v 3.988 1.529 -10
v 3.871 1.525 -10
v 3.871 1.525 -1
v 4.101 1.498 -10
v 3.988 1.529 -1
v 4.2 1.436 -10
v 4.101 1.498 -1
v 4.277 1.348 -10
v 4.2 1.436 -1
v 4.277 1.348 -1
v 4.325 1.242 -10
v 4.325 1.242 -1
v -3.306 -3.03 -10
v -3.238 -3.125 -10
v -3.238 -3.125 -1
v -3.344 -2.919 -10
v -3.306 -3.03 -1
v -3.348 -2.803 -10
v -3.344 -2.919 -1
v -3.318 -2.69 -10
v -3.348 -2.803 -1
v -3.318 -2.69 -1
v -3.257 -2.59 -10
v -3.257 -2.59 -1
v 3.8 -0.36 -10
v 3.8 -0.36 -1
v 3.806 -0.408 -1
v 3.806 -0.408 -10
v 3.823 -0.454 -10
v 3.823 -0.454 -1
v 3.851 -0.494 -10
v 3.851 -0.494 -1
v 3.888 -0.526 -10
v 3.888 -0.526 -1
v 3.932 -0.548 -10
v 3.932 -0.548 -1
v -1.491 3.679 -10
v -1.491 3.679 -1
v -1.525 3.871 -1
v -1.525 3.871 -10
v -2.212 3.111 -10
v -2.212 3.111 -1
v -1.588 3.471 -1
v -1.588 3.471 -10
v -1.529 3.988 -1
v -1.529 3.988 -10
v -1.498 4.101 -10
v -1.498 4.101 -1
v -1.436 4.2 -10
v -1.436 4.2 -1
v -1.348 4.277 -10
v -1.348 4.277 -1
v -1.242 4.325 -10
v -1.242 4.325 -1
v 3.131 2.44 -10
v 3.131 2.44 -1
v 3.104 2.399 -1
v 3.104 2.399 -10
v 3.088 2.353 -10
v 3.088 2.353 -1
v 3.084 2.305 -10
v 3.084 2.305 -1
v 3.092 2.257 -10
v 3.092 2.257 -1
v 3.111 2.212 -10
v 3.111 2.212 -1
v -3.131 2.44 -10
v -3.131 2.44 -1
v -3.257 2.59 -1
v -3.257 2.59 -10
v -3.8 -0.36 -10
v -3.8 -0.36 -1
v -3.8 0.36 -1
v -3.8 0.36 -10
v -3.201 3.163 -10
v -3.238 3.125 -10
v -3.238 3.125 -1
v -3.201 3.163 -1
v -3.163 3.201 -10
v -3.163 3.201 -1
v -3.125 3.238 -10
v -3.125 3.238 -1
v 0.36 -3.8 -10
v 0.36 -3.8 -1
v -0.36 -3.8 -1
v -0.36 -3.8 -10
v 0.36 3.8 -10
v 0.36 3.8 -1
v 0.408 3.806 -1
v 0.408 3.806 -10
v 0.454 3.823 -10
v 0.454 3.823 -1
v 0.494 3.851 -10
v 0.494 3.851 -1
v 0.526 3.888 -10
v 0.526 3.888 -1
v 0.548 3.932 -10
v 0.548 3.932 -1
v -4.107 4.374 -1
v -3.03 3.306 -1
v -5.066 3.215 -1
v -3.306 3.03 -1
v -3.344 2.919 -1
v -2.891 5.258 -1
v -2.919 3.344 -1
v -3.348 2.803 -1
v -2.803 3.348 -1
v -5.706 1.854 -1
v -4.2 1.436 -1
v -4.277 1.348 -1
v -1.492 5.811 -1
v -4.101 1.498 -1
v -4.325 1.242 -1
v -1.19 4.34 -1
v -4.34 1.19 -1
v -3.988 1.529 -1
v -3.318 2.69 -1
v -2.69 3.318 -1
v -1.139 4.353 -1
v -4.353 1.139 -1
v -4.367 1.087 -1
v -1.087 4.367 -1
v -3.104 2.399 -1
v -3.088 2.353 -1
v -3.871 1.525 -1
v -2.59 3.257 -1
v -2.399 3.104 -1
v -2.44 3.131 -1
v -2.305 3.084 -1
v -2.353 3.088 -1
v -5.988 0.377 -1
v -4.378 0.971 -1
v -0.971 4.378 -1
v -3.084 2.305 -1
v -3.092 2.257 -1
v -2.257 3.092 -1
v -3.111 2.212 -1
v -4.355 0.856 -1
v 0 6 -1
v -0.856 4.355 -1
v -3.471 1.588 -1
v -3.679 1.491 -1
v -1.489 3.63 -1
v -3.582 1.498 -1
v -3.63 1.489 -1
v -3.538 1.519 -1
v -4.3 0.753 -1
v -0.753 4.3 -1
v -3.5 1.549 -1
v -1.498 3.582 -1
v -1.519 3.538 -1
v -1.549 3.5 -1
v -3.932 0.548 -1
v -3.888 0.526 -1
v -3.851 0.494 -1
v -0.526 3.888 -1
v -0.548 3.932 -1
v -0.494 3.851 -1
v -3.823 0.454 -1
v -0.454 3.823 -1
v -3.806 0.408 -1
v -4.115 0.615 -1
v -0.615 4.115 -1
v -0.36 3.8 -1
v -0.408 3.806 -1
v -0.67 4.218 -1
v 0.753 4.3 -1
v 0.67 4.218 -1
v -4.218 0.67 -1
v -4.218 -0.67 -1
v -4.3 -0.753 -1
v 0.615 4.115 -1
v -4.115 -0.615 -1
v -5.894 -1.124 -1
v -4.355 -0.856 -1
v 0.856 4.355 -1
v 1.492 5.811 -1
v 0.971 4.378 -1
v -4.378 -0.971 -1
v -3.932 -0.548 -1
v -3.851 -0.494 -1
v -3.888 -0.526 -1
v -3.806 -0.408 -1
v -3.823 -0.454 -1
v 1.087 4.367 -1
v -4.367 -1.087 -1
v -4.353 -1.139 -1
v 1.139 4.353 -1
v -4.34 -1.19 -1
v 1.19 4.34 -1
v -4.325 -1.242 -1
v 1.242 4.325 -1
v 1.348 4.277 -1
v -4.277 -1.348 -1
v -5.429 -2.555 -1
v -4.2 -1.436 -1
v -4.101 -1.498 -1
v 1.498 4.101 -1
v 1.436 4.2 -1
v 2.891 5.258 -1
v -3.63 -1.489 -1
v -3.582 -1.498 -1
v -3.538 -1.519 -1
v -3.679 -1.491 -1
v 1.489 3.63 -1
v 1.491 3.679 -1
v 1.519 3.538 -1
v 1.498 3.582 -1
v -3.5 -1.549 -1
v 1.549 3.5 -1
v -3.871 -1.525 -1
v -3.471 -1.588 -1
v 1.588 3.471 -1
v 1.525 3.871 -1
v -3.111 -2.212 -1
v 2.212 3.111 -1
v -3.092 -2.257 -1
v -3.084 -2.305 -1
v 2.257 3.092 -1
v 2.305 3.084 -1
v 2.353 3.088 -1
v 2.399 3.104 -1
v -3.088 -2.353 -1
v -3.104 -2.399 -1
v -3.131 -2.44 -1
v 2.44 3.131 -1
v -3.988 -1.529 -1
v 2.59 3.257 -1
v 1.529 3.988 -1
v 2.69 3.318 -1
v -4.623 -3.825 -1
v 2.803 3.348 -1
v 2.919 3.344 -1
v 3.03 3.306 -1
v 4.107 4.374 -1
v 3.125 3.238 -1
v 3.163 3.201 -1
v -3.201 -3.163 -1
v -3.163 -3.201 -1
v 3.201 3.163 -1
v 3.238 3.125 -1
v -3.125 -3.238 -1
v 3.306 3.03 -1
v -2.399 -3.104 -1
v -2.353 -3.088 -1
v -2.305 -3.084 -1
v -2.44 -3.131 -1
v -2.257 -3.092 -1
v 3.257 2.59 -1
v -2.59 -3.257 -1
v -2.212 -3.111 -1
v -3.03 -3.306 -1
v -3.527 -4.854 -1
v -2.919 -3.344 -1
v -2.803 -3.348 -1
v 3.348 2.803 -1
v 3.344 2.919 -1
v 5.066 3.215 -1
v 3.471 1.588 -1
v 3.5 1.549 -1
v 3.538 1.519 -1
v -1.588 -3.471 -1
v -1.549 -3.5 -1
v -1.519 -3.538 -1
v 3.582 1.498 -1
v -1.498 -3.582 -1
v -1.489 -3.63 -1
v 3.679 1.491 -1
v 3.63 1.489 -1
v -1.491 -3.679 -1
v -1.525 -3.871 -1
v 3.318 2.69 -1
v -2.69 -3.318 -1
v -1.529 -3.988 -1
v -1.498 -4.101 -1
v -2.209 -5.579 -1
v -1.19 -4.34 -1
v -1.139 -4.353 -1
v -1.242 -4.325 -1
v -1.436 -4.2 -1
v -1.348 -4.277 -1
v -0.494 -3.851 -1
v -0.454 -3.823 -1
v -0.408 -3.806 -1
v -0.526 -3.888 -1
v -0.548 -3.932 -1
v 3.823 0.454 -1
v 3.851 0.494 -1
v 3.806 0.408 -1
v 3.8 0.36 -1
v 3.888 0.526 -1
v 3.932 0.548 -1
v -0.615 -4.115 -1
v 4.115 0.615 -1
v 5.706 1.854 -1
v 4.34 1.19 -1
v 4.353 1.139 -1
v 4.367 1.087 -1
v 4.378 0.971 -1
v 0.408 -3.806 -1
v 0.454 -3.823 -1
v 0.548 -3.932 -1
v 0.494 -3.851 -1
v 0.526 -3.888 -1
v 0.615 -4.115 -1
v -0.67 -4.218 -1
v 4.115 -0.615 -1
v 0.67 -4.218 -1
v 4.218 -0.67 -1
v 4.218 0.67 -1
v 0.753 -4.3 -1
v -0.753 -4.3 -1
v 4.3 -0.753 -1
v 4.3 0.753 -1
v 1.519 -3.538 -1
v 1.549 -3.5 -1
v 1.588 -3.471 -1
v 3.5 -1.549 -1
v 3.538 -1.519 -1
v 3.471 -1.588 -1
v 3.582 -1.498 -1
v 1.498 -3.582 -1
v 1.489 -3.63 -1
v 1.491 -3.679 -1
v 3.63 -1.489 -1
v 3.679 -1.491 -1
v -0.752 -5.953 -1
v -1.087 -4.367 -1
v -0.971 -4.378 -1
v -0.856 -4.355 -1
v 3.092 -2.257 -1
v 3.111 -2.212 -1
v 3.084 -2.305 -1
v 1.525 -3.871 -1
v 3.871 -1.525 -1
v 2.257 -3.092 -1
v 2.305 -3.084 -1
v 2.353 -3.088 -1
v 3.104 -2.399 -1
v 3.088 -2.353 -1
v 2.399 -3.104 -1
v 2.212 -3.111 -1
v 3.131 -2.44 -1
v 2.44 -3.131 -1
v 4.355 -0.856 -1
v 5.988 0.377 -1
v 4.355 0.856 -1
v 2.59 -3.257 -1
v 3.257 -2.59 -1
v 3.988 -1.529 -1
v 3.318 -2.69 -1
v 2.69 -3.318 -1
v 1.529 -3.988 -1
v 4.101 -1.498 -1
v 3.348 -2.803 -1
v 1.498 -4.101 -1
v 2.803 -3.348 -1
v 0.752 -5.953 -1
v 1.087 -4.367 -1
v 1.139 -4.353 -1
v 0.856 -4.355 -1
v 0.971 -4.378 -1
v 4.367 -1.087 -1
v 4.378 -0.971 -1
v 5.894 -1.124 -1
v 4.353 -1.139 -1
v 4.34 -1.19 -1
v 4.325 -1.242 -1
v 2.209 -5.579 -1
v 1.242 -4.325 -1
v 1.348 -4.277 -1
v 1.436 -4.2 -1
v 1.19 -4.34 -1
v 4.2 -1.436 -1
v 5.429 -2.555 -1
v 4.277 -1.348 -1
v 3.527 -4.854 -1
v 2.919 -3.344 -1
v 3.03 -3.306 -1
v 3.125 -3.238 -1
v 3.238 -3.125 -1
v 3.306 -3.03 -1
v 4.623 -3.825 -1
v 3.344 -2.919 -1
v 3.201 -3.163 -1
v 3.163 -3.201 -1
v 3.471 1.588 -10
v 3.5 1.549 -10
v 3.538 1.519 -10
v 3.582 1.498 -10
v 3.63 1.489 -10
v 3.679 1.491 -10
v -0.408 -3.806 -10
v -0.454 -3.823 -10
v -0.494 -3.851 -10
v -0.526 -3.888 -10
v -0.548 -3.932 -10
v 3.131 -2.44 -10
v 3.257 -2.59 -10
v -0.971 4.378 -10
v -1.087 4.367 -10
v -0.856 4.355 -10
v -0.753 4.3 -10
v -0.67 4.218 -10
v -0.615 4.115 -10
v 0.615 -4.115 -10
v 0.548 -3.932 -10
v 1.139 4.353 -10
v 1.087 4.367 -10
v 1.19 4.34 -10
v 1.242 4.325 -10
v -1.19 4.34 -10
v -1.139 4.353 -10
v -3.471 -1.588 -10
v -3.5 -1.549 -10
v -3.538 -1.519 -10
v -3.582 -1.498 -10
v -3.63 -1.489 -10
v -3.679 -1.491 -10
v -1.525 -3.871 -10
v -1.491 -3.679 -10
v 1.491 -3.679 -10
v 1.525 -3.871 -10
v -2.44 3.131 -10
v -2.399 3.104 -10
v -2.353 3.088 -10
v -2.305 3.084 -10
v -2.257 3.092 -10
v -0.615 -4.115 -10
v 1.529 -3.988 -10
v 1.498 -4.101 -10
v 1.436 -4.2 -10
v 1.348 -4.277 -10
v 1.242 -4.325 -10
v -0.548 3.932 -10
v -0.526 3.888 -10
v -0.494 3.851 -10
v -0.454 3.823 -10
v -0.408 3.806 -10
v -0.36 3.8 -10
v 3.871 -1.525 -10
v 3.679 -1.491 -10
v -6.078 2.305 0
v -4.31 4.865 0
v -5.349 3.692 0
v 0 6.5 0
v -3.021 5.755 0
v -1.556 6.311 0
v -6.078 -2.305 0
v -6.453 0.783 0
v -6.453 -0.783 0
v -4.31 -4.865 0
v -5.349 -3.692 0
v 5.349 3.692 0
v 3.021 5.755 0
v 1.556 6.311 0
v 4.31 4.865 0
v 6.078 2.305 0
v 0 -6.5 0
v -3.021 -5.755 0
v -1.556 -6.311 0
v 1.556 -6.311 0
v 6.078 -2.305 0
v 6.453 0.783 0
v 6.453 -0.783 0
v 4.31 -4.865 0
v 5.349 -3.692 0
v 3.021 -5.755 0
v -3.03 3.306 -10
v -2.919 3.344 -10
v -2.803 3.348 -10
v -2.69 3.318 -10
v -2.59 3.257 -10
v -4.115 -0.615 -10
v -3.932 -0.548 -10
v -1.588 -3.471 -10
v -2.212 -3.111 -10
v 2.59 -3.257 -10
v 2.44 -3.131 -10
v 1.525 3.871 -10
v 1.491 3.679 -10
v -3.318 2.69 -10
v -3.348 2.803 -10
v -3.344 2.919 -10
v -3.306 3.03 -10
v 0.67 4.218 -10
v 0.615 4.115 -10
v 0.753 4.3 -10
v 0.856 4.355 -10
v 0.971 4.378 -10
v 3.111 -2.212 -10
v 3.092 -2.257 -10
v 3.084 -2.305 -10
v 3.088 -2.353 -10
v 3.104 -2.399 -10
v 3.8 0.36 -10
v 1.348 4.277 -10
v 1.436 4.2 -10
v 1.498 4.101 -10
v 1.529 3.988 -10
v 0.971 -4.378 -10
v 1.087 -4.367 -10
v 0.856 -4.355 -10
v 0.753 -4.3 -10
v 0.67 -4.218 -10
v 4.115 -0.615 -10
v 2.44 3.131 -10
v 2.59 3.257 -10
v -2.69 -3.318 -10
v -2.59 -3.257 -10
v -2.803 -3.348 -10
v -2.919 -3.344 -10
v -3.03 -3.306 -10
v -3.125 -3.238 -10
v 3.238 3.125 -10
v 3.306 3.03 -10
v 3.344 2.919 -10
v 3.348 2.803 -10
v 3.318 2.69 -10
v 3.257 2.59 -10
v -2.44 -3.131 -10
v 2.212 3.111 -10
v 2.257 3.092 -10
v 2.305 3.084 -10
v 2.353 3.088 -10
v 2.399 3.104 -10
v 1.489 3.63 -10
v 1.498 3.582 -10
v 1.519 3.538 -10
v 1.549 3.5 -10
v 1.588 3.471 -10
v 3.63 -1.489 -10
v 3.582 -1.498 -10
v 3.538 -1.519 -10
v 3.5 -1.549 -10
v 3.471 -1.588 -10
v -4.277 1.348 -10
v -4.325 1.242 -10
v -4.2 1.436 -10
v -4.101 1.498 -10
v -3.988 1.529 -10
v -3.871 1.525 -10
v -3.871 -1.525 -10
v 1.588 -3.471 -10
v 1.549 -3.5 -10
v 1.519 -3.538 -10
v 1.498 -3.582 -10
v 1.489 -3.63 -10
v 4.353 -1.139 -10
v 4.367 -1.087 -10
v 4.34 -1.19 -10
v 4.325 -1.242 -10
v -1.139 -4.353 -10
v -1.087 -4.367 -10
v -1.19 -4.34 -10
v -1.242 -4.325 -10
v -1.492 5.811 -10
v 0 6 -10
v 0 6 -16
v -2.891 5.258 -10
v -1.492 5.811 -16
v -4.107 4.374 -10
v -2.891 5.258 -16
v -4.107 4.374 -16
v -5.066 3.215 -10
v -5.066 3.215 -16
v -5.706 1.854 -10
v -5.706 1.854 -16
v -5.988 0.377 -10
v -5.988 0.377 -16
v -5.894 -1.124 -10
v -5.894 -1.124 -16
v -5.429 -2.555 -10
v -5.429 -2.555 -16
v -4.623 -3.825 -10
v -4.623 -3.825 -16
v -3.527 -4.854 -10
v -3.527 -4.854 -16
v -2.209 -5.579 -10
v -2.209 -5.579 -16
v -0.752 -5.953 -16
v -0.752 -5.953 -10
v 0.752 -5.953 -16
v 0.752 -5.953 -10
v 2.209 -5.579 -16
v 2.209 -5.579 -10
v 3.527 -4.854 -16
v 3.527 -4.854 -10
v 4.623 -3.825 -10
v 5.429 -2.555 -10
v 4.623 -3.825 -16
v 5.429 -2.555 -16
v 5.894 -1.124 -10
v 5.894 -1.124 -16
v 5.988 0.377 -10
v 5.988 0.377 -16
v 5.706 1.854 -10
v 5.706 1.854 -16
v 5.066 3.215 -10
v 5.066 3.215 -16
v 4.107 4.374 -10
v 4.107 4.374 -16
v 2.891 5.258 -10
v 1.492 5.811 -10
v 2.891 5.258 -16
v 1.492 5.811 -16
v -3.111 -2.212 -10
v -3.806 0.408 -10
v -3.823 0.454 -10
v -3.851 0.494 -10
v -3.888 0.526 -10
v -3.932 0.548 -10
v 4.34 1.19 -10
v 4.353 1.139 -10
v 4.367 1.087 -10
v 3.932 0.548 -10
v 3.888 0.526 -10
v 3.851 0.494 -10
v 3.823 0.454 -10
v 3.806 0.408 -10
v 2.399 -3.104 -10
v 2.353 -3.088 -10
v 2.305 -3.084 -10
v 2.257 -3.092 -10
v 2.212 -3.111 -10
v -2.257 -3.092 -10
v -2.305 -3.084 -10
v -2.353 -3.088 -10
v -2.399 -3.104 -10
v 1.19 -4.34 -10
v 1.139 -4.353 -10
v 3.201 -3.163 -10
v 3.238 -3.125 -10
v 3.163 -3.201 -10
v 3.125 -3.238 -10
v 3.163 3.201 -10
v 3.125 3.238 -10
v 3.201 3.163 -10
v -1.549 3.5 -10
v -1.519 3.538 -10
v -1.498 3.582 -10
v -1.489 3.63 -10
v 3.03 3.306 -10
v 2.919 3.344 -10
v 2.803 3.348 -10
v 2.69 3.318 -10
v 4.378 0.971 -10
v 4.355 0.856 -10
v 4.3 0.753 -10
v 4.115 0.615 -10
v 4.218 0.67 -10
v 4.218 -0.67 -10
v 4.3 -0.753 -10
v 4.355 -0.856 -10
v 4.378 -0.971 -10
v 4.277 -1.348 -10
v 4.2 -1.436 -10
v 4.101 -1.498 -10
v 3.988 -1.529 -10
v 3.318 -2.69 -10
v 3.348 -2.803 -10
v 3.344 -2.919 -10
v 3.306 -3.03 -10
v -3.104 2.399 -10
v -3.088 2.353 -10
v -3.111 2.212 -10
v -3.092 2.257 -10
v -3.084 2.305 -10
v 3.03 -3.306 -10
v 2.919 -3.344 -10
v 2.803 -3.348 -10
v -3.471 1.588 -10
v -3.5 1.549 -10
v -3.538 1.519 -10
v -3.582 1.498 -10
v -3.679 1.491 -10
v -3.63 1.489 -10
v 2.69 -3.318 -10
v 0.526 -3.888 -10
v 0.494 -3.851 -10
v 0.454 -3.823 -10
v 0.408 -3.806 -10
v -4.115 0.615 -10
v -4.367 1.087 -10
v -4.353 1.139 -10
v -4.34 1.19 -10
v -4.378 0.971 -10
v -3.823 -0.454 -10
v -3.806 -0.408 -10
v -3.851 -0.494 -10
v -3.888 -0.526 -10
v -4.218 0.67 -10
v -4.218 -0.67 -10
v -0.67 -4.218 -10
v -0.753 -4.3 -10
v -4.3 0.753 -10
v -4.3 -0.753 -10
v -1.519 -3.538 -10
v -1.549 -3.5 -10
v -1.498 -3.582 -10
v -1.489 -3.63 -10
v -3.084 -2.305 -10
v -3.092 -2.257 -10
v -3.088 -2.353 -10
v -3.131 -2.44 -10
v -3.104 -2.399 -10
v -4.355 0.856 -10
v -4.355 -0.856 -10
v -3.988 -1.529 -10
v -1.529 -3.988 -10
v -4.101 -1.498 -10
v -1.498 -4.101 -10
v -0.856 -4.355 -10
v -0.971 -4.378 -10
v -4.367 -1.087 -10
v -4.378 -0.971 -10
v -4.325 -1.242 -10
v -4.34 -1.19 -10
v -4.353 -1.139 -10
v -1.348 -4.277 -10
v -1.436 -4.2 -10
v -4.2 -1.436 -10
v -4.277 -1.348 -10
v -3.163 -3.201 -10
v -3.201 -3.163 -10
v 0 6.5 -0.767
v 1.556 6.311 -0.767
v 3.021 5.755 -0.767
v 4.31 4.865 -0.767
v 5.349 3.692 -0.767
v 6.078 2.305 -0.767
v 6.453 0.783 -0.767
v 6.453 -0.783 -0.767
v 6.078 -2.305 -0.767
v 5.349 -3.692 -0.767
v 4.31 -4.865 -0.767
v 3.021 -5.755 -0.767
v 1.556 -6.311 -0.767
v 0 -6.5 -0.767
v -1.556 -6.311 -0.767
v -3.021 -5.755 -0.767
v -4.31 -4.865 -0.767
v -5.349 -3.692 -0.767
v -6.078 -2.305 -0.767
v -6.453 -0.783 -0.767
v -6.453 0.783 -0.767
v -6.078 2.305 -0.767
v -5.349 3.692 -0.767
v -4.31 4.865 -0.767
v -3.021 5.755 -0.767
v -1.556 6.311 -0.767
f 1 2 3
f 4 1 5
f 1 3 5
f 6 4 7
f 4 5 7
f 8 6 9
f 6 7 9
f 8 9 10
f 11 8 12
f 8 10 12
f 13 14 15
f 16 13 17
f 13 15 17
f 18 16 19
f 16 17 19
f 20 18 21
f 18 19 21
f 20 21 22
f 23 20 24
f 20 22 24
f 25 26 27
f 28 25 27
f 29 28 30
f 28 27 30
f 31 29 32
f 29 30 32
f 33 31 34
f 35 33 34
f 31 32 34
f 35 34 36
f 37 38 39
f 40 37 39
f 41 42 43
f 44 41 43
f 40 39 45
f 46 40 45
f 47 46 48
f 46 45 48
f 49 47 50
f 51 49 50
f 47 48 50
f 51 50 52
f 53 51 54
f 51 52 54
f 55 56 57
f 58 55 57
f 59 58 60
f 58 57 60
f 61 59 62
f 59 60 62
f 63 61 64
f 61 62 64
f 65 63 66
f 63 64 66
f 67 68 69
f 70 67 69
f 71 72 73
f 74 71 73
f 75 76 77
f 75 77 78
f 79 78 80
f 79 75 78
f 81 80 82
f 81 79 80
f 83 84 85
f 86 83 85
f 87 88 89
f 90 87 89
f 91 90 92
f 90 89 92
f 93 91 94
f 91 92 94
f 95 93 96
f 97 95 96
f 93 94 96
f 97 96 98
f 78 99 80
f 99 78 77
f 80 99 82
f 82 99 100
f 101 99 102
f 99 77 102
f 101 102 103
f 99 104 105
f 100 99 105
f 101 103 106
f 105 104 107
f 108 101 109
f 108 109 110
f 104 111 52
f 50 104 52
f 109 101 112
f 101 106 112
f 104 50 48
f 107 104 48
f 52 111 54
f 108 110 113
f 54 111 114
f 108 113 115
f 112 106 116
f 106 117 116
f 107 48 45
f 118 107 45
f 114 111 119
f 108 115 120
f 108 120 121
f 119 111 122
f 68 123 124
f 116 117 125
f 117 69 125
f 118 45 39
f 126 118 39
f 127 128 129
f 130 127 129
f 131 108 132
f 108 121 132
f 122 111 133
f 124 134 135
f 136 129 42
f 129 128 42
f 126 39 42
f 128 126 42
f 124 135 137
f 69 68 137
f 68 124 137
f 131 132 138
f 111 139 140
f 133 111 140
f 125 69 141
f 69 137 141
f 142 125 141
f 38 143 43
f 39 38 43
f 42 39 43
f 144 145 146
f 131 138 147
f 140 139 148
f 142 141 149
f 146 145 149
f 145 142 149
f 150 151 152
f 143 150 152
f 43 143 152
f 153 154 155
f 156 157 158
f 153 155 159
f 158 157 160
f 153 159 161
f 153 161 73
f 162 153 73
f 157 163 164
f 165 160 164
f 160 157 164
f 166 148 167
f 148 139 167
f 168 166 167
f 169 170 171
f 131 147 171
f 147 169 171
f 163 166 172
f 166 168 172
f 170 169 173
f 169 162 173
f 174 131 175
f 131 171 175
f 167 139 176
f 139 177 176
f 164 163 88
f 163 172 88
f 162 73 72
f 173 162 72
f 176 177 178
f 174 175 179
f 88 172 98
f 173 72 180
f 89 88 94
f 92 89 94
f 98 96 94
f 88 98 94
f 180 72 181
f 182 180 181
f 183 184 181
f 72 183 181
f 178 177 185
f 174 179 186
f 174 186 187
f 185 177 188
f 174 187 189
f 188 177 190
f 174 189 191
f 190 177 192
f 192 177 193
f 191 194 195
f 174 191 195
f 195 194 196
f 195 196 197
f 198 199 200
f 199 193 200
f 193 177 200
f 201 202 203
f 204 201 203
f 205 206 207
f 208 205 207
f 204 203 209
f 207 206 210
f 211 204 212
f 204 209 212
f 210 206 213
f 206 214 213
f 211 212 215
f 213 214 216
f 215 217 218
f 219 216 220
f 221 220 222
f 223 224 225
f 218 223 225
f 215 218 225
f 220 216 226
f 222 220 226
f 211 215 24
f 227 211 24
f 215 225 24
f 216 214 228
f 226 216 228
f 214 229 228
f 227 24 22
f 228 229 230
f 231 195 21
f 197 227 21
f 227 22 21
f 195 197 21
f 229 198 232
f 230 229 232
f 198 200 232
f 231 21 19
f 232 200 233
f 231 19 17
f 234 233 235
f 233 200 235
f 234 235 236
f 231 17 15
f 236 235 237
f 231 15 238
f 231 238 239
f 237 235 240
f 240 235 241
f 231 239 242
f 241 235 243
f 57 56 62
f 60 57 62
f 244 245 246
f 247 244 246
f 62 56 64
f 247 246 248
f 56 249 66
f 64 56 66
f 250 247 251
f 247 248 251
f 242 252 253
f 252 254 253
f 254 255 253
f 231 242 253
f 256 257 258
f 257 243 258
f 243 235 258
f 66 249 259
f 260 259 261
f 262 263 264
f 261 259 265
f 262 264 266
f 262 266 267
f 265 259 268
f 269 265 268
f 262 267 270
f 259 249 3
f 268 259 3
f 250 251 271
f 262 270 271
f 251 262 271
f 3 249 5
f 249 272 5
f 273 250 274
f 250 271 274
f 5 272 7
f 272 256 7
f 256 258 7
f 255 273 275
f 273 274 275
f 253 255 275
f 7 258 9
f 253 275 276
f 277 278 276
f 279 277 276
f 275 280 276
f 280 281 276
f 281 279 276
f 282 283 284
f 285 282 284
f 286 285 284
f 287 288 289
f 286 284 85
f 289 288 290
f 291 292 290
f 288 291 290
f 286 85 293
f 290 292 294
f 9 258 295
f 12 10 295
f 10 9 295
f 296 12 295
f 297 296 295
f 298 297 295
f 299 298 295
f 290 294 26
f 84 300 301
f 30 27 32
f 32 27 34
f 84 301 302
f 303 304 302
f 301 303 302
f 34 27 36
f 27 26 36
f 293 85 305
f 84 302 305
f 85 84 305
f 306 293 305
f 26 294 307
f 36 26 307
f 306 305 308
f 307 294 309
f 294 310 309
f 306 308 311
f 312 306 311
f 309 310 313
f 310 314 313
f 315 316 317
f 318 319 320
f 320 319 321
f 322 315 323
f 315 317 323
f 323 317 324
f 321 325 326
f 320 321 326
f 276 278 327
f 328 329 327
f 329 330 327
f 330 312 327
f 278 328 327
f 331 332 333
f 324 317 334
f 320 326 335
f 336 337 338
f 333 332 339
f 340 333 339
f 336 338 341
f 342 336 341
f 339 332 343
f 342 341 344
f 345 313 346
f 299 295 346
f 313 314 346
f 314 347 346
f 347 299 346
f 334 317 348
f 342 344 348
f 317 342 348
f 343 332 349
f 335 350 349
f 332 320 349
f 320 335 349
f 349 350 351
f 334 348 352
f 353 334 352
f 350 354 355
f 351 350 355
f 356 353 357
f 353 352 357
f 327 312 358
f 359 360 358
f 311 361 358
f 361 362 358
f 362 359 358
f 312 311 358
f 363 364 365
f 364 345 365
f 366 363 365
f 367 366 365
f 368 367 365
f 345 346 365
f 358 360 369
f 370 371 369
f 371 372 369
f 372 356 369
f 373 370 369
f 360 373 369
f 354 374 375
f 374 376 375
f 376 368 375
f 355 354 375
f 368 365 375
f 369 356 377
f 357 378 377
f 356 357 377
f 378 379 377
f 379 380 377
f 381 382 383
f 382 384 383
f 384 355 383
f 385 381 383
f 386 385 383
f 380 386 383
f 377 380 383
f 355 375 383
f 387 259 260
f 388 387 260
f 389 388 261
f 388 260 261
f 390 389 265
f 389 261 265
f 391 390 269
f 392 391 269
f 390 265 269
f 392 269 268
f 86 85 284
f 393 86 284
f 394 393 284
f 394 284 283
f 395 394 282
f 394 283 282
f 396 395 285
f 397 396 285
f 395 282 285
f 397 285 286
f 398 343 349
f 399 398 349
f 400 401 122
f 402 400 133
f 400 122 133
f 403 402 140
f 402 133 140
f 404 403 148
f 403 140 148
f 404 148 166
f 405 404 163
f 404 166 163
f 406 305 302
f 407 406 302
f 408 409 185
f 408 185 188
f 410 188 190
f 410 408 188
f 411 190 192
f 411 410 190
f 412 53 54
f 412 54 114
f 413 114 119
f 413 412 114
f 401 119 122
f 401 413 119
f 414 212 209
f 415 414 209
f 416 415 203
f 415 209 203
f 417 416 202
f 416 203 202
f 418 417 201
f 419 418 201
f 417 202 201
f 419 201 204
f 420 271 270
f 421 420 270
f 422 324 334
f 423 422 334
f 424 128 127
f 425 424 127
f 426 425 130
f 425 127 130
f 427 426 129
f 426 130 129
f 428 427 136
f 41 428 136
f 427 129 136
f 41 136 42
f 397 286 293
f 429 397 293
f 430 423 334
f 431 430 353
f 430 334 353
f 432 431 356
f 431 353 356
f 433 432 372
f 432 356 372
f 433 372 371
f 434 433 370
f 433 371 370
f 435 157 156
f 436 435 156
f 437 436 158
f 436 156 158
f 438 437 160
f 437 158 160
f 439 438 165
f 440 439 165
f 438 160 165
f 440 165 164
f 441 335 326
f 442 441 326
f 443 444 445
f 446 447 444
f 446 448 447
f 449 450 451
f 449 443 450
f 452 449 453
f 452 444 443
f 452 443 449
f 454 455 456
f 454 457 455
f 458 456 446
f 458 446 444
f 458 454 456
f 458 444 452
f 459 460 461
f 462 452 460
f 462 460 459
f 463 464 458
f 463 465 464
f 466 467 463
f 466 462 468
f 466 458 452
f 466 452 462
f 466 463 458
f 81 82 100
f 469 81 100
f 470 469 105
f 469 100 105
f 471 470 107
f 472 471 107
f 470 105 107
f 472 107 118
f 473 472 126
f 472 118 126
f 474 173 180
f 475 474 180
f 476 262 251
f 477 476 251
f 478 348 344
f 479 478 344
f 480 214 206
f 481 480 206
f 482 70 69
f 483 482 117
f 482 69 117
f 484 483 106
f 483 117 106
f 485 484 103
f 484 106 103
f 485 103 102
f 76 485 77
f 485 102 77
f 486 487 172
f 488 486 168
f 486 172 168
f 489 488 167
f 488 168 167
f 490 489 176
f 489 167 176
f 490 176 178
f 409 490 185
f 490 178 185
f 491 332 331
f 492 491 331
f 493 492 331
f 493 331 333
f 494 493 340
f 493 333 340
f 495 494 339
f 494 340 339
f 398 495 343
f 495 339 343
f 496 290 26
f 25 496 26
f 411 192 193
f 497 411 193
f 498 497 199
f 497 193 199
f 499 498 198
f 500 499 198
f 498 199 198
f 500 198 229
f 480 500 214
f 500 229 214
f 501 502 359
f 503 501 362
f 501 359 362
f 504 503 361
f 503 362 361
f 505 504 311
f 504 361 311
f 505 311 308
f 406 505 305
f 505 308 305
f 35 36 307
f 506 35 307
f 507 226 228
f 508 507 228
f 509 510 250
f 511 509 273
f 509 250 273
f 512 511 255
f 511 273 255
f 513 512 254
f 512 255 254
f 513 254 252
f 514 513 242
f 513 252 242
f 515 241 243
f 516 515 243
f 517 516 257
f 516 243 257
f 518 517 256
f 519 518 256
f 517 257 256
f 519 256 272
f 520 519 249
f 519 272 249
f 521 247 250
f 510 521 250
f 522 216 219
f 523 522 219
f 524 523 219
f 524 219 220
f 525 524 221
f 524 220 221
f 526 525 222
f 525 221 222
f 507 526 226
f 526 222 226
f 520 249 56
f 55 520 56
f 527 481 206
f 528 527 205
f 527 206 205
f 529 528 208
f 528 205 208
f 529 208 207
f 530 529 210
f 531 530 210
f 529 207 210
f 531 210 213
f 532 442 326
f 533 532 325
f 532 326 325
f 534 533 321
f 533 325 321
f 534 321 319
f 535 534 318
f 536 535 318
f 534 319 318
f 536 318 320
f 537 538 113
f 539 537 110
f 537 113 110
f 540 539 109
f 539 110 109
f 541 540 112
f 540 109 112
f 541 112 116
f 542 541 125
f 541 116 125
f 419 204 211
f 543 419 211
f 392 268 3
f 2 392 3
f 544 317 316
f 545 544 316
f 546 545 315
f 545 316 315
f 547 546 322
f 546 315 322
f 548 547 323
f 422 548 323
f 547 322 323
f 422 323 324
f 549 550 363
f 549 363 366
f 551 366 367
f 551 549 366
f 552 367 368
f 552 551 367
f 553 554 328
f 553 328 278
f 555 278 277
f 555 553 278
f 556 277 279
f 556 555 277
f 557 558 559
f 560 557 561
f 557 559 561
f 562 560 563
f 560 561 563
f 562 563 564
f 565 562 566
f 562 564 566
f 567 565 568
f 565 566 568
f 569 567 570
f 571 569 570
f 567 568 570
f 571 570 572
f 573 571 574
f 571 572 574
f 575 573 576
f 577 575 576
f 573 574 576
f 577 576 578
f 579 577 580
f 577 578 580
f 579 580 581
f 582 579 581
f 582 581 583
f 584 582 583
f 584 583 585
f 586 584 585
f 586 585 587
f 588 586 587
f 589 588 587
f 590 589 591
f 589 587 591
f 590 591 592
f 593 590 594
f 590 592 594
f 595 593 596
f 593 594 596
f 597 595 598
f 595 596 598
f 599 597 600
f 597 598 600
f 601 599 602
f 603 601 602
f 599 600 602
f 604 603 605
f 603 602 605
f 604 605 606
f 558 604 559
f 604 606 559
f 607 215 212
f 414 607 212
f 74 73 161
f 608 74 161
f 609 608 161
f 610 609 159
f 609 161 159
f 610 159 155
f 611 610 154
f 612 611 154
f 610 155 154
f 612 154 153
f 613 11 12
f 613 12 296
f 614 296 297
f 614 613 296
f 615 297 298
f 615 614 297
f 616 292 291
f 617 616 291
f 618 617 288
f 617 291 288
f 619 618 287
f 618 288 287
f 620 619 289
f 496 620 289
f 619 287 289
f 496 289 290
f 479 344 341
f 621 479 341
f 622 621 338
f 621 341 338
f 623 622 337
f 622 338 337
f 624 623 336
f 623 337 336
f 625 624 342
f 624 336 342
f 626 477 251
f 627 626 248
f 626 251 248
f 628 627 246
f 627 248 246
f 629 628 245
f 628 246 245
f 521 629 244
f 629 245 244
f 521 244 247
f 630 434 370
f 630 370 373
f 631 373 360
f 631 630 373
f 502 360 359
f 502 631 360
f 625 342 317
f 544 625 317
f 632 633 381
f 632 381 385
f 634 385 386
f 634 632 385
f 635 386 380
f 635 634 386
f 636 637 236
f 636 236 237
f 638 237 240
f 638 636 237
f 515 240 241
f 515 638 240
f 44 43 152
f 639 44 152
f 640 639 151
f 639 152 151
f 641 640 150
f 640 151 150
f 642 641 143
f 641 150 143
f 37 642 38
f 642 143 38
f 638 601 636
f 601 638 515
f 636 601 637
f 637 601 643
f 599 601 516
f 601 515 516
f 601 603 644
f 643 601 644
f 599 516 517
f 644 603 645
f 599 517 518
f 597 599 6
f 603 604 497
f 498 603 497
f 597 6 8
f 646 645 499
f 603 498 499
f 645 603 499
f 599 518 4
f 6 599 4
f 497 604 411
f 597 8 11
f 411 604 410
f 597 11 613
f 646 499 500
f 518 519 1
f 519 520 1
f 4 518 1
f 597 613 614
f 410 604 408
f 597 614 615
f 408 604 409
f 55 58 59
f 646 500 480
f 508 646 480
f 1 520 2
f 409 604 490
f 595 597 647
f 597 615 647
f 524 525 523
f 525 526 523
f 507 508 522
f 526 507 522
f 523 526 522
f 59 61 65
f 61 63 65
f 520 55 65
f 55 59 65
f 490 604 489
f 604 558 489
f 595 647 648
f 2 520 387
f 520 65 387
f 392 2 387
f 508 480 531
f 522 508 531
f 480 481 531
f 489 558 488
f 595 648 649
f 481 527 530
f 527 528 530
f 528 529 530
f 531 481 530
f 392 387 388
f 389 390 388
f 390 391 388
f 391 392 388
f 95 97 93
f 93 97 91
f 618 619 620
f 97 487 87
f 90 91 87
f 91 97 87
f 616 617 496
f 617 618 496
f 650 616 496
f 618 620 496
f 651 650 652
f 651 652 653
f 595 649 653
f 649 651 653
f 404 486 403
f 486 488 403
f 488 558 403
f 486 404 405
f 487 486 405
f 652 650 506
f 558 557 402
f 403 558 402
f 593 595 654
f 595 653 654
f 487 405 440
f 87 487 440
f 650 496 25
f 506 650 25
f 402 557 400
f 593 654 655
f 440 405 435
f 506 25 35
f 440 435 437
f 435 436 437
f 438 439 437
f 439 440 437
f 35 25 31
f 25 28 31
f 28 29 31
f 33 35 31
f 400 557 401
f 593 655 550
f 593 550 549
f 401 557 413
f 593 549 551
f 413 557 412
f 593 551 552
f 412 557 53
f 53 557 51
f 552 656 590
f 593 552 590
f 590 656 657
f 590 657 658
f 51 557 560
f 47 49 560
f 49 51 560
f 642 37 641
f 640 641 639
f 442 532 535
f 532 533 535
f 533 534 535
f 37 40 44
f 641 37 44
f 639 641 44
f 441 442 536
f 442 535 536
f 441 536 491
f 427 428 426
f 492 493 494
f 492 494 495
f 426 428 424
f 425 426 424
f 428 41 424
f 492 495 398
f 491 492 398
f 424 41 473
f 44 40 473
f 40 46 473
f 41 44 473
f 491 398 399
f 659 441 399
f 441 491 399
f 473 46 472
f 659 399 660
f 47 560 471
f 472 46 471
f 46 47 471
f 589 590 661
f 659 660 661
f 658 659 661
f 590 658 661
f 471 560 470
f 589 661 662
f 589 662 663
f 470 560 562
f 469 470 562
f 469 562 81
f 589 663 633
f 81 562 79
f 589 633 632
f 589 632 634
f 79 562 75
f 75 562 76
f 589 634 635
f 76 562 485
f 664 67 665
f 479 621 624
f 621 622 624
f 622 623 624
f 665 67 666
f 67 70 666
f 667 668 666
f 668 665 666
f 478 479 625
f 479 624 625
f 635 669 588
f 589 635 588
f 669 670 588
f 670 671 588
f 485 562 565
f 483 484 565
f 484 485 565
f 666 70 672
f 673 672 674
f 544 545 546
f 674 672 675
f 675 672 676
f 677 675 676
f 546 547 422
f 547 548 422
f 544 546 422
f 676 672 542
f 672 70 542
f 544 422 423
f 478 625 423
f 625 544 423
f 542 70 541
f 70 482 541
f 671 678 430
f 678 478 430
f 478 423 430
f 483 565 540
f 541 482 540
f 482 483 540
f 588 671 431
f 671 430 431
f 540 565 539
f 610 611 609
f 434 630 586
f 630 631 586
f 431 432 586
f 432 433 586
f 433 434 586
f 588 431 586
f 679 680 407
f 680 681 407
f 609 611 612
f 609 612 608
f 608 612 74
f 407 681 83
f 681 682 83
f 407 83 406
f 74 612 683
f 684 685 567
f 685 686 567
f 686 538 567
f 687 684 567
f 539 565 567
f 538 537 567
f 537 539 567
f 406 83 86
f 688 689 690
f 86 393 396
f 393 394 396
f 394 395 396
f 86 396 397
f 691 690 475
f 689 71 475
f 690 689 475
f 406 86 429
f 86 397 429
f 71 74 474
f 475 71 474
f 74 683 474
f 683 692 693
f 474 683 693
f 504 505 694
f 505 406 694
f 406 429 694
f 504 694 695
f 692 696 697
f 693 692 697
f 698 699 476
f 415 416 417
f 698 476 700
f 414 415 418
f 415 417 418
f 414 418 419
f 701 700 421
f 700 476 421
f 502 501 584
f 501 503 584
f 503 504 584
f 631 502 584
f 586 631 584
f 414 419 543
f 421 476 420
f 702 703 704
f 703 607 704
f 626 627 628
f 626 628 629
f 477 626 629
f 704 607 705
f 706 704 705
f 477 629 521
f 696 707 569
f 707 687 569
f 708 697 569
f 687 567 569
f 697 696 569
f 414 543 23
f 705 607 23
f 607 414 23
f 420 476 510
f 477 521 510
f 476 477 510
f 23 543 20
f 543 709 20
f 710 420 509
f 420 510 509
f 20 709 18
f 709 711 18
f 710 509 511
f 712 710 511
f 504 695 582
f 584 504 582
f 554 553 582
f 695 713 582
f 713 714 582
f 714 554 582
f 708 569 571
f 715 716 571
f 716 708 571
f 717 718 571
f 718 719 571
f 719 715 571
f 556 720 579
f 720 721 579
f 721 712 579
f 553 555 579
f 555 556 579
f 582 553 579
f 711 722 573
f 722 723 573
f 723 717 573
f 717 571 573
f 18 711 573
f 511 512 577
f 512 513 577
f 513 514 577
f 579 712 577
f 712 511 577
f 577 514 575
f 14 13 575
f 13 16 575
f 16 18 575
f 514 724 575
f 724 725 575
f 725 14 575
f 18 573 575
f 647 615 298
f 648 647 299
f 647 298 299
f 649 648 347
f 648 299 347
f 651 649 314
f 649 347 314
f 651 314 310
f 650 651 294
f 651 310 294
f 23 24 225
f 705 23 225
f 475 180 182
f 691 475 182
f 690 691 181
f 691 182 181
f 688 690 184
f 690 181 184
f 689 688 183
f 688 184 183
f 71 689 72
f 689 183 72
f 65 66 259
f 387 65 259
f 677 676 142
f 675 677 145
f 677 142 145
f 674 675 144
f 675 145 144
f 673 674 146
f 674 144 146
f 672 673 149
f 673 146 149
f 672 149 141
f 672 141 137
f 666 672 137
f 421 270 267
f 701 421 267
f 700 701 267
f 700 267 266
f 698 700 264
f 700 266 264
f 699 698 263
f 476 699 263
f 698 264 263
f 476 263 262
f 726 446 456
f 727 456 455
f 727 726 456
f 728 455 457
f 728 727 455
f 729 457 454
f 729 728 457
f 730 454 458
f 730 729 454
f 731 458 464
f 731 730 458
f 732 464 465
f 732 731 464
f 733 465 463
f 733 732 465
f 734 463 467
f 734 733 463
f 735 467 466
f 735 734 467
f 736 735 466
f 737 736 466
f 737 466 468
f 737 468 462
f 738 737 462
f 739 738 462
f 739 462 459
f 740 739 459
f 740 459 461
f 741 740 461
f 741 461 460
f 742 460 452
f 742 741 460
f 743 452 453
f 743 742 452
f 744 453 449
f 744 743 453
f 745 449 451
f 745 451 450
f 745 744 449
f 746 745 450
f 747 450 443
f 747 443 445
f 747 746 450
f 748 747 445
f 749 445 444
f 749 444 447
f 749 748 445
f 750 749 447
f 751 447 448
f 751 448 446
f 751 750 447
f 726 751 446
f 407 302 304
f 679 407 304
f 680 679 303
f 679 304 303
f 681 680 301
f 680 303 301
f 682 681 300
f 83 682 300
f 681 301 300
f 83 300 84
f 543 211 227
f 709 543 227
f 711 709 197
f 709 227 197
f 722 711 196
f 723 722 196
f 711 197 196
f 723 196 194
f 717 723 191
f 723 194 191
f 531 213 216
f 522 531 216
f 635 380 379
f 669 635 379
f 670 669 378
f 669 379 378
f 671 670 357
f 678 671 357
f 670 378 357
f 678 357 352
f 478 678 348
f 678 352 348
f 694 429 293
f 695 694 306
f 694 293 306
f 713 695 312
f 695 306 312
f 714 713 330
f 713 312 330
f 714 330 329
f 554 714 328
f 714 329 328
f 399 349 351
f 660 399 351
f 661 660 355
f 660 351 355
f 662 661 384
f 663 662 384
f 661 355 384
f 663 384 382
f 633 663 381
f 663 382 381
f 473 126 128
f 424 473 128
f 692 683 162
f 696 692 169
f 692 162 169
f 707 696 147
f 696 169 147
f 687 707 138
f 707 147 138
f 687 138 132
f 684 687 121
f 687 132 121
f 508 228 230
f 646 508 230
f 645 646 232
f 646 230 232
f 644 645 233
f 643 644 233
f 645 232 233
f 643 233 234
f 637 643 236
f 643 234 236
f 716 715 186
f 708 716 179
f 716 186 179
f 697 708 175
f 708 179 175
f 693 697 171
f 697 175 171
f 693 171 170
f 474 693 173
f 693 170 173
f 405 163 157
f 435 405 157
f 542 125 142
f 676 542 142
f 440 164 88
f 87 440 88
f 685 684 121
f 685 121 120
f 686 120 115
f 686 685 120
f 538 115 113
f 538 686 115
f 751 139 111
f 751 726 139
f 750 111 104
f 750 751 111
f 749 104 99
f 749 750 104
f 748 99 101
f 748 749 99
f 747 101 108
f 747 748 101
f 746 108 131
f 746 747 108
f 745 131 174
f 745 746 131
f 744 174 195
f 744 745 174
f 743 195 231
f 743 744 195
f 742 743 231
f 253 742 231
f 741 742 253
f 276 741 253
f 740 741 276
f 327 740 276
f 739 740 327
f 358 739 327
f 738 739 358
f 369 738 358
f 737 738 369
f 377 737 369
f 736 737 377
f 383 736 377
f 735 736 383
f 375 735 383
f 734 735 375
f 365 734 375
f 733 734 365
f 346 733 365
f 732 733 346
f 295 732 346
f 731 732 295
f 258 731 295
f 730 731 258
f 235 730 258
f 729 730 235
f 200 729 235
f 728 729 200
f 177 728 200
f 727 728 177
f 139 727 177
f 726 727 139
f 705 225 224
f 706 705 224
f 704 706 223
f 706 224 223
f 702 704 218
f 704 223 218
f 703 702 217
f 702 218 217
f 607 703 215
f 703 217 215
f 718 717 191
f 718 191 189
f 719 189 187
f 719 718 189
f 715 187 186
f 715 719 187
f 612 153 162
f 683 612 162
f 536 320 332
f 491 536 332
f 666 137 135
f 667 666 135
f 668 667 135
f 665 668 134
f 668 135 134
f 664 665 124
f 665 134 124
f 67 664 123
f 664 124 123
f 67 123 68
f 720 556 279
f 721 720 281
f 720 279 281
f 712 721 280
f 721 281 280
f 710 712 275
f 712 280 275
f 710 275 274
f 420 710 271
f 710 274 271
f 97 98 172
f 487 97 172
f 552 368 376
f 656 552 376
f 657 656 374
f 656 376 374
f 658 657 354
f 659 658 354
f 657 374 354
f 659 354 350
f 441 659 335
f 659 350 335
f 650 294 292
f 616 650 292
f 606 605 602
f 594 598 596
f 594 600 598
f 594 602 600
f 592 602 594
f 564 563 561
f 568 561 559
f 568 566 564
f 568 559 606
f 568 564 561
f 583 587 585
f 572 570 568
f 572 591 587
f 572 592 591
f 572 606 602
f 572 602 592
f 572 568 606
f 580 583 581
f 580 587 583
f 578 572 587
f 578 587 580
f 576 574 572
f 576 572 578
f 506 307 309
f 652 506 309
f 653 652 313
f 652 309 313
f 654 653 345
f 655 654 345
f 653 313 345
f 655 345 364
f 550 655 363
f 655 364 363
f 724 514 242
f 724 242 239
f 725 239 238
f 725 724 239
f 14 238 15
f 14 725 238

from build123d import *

# Parameters (mm, degrees)
SKETCH5_W           = 10
SKETCH5_H           = 4.5
SKETCH16_W          = 6
SKETCH16_H          = 6
CUT_TOOTH_DEPTH     = 10
PATTERN_TOOTH_COUNT = 12


with BuildPart() as part:
    # Sketch5 → body (revolve)
    with BuildSketch(Plane(origin=(0, 0, 0), x_dir=(0, 0, -1), z_dir=(1, 0, 0))):
        with Locations((5, 2.25)):
            Rectangle(SKETCH5_W, SKETCH5_H)
    revolve(axis=Axis((0, 0, 0), (0, 0, -1)))

    # Sketch16 → body-hub (revolve)
    with BuildSketch(Plane(origin=(0, 0, 0), x_dir=(0, 0, -1), z_dir=(1, 0, 0))):
        with Locations((13, 3)):
            Rectangle(SKETCH16_W, SKETCH16_H)
    revolve(axis=Axis((0, 0, -16), (0, 0, 1)))

    # Sketch23 → cut-tooth (cut)
    with BuildSketch(Plane.XY):
        with BuildLine():
            Line((0.547897017, 3.931595971), (0.6147699, 4.11532771))
            ThreePointArc((0.6147699, 4.11532771), (0.802803604, 4.331669589), (1.087295431, 4.366667911))
            Line((1.087295431, 4.366667911), (1.087295431, 4.933335822))
            Line((1.087295431, 4.933335822), (-1.087295431, 4.933335822))
            Line((-1.087295431, 4.933335822), (-1.087295431, 4.366667911))
            ThreePointArc((-1.087295431, 4.366667911), (-0.802803604, 4.331669589), (-0.6147699, 4.11532771))
            Line((-0.6147699, 4.11532771), (-0.547897017, 3.931595971))
            ThreePointArc((-0.547897017, 3.931595971), (-0.47467378, 3.836169591), (-0.359958492, 3.8))
            Line((-0.359958492, 3.8), (0.359958492, 3.8))
            ThreePointArc((0.359958492, 3.8), (0.47467378, 3.836169591), (0.547897017, 3.931595971))
        make_face()
    cut_tooth = extrude(amount=-CUT_TOOTH_DEPTH, mode=Mode.SUBTRACT)

    # pattern-tooth: cut-tooth ×12 about axis
    pattern_tooth_axis = Axis((0, 0, -10), (0, 0, 1))
    for i in range(1, PATTERN_TOOTH_COUNT):
        add(cut_tooth.rotate(pattern_tooth_axis, i * 360 / PATTERN_TOOTH_COUNT), mode=Mode.SUBTRACT)

    # Sketch25 → body-flange-front (revolve)
    with BuildSketch(Plane(origin=(0, 0, 0), x_dir=(0, 0, -1), z_dir=(1, 0, 0))):
        Polygon((1, 3.25), (0, 3.25), (0, 5.416666667), (0, 6.5), (1, 6.5), (1, 5.416666667), align=None)
    revolve(axis=Axis((0, 0, 0), (0, 0, -1)))

    # Sketch28 → body-flange-profile-front (revolve, cut)
    with BuildSketch(Plane(origin=(0, 0, 0), x_dir=(0, 0, -1), z_dir=(1, 0, 0))):
        Polygon((1, 6.5), (1, 6), (0.766846171, 6.5), align=None)
    revolve(axis=Axis((0, 0, -10), (0, 0, 1)), mode=Mode.SUBTRACT)


solid = part.part
